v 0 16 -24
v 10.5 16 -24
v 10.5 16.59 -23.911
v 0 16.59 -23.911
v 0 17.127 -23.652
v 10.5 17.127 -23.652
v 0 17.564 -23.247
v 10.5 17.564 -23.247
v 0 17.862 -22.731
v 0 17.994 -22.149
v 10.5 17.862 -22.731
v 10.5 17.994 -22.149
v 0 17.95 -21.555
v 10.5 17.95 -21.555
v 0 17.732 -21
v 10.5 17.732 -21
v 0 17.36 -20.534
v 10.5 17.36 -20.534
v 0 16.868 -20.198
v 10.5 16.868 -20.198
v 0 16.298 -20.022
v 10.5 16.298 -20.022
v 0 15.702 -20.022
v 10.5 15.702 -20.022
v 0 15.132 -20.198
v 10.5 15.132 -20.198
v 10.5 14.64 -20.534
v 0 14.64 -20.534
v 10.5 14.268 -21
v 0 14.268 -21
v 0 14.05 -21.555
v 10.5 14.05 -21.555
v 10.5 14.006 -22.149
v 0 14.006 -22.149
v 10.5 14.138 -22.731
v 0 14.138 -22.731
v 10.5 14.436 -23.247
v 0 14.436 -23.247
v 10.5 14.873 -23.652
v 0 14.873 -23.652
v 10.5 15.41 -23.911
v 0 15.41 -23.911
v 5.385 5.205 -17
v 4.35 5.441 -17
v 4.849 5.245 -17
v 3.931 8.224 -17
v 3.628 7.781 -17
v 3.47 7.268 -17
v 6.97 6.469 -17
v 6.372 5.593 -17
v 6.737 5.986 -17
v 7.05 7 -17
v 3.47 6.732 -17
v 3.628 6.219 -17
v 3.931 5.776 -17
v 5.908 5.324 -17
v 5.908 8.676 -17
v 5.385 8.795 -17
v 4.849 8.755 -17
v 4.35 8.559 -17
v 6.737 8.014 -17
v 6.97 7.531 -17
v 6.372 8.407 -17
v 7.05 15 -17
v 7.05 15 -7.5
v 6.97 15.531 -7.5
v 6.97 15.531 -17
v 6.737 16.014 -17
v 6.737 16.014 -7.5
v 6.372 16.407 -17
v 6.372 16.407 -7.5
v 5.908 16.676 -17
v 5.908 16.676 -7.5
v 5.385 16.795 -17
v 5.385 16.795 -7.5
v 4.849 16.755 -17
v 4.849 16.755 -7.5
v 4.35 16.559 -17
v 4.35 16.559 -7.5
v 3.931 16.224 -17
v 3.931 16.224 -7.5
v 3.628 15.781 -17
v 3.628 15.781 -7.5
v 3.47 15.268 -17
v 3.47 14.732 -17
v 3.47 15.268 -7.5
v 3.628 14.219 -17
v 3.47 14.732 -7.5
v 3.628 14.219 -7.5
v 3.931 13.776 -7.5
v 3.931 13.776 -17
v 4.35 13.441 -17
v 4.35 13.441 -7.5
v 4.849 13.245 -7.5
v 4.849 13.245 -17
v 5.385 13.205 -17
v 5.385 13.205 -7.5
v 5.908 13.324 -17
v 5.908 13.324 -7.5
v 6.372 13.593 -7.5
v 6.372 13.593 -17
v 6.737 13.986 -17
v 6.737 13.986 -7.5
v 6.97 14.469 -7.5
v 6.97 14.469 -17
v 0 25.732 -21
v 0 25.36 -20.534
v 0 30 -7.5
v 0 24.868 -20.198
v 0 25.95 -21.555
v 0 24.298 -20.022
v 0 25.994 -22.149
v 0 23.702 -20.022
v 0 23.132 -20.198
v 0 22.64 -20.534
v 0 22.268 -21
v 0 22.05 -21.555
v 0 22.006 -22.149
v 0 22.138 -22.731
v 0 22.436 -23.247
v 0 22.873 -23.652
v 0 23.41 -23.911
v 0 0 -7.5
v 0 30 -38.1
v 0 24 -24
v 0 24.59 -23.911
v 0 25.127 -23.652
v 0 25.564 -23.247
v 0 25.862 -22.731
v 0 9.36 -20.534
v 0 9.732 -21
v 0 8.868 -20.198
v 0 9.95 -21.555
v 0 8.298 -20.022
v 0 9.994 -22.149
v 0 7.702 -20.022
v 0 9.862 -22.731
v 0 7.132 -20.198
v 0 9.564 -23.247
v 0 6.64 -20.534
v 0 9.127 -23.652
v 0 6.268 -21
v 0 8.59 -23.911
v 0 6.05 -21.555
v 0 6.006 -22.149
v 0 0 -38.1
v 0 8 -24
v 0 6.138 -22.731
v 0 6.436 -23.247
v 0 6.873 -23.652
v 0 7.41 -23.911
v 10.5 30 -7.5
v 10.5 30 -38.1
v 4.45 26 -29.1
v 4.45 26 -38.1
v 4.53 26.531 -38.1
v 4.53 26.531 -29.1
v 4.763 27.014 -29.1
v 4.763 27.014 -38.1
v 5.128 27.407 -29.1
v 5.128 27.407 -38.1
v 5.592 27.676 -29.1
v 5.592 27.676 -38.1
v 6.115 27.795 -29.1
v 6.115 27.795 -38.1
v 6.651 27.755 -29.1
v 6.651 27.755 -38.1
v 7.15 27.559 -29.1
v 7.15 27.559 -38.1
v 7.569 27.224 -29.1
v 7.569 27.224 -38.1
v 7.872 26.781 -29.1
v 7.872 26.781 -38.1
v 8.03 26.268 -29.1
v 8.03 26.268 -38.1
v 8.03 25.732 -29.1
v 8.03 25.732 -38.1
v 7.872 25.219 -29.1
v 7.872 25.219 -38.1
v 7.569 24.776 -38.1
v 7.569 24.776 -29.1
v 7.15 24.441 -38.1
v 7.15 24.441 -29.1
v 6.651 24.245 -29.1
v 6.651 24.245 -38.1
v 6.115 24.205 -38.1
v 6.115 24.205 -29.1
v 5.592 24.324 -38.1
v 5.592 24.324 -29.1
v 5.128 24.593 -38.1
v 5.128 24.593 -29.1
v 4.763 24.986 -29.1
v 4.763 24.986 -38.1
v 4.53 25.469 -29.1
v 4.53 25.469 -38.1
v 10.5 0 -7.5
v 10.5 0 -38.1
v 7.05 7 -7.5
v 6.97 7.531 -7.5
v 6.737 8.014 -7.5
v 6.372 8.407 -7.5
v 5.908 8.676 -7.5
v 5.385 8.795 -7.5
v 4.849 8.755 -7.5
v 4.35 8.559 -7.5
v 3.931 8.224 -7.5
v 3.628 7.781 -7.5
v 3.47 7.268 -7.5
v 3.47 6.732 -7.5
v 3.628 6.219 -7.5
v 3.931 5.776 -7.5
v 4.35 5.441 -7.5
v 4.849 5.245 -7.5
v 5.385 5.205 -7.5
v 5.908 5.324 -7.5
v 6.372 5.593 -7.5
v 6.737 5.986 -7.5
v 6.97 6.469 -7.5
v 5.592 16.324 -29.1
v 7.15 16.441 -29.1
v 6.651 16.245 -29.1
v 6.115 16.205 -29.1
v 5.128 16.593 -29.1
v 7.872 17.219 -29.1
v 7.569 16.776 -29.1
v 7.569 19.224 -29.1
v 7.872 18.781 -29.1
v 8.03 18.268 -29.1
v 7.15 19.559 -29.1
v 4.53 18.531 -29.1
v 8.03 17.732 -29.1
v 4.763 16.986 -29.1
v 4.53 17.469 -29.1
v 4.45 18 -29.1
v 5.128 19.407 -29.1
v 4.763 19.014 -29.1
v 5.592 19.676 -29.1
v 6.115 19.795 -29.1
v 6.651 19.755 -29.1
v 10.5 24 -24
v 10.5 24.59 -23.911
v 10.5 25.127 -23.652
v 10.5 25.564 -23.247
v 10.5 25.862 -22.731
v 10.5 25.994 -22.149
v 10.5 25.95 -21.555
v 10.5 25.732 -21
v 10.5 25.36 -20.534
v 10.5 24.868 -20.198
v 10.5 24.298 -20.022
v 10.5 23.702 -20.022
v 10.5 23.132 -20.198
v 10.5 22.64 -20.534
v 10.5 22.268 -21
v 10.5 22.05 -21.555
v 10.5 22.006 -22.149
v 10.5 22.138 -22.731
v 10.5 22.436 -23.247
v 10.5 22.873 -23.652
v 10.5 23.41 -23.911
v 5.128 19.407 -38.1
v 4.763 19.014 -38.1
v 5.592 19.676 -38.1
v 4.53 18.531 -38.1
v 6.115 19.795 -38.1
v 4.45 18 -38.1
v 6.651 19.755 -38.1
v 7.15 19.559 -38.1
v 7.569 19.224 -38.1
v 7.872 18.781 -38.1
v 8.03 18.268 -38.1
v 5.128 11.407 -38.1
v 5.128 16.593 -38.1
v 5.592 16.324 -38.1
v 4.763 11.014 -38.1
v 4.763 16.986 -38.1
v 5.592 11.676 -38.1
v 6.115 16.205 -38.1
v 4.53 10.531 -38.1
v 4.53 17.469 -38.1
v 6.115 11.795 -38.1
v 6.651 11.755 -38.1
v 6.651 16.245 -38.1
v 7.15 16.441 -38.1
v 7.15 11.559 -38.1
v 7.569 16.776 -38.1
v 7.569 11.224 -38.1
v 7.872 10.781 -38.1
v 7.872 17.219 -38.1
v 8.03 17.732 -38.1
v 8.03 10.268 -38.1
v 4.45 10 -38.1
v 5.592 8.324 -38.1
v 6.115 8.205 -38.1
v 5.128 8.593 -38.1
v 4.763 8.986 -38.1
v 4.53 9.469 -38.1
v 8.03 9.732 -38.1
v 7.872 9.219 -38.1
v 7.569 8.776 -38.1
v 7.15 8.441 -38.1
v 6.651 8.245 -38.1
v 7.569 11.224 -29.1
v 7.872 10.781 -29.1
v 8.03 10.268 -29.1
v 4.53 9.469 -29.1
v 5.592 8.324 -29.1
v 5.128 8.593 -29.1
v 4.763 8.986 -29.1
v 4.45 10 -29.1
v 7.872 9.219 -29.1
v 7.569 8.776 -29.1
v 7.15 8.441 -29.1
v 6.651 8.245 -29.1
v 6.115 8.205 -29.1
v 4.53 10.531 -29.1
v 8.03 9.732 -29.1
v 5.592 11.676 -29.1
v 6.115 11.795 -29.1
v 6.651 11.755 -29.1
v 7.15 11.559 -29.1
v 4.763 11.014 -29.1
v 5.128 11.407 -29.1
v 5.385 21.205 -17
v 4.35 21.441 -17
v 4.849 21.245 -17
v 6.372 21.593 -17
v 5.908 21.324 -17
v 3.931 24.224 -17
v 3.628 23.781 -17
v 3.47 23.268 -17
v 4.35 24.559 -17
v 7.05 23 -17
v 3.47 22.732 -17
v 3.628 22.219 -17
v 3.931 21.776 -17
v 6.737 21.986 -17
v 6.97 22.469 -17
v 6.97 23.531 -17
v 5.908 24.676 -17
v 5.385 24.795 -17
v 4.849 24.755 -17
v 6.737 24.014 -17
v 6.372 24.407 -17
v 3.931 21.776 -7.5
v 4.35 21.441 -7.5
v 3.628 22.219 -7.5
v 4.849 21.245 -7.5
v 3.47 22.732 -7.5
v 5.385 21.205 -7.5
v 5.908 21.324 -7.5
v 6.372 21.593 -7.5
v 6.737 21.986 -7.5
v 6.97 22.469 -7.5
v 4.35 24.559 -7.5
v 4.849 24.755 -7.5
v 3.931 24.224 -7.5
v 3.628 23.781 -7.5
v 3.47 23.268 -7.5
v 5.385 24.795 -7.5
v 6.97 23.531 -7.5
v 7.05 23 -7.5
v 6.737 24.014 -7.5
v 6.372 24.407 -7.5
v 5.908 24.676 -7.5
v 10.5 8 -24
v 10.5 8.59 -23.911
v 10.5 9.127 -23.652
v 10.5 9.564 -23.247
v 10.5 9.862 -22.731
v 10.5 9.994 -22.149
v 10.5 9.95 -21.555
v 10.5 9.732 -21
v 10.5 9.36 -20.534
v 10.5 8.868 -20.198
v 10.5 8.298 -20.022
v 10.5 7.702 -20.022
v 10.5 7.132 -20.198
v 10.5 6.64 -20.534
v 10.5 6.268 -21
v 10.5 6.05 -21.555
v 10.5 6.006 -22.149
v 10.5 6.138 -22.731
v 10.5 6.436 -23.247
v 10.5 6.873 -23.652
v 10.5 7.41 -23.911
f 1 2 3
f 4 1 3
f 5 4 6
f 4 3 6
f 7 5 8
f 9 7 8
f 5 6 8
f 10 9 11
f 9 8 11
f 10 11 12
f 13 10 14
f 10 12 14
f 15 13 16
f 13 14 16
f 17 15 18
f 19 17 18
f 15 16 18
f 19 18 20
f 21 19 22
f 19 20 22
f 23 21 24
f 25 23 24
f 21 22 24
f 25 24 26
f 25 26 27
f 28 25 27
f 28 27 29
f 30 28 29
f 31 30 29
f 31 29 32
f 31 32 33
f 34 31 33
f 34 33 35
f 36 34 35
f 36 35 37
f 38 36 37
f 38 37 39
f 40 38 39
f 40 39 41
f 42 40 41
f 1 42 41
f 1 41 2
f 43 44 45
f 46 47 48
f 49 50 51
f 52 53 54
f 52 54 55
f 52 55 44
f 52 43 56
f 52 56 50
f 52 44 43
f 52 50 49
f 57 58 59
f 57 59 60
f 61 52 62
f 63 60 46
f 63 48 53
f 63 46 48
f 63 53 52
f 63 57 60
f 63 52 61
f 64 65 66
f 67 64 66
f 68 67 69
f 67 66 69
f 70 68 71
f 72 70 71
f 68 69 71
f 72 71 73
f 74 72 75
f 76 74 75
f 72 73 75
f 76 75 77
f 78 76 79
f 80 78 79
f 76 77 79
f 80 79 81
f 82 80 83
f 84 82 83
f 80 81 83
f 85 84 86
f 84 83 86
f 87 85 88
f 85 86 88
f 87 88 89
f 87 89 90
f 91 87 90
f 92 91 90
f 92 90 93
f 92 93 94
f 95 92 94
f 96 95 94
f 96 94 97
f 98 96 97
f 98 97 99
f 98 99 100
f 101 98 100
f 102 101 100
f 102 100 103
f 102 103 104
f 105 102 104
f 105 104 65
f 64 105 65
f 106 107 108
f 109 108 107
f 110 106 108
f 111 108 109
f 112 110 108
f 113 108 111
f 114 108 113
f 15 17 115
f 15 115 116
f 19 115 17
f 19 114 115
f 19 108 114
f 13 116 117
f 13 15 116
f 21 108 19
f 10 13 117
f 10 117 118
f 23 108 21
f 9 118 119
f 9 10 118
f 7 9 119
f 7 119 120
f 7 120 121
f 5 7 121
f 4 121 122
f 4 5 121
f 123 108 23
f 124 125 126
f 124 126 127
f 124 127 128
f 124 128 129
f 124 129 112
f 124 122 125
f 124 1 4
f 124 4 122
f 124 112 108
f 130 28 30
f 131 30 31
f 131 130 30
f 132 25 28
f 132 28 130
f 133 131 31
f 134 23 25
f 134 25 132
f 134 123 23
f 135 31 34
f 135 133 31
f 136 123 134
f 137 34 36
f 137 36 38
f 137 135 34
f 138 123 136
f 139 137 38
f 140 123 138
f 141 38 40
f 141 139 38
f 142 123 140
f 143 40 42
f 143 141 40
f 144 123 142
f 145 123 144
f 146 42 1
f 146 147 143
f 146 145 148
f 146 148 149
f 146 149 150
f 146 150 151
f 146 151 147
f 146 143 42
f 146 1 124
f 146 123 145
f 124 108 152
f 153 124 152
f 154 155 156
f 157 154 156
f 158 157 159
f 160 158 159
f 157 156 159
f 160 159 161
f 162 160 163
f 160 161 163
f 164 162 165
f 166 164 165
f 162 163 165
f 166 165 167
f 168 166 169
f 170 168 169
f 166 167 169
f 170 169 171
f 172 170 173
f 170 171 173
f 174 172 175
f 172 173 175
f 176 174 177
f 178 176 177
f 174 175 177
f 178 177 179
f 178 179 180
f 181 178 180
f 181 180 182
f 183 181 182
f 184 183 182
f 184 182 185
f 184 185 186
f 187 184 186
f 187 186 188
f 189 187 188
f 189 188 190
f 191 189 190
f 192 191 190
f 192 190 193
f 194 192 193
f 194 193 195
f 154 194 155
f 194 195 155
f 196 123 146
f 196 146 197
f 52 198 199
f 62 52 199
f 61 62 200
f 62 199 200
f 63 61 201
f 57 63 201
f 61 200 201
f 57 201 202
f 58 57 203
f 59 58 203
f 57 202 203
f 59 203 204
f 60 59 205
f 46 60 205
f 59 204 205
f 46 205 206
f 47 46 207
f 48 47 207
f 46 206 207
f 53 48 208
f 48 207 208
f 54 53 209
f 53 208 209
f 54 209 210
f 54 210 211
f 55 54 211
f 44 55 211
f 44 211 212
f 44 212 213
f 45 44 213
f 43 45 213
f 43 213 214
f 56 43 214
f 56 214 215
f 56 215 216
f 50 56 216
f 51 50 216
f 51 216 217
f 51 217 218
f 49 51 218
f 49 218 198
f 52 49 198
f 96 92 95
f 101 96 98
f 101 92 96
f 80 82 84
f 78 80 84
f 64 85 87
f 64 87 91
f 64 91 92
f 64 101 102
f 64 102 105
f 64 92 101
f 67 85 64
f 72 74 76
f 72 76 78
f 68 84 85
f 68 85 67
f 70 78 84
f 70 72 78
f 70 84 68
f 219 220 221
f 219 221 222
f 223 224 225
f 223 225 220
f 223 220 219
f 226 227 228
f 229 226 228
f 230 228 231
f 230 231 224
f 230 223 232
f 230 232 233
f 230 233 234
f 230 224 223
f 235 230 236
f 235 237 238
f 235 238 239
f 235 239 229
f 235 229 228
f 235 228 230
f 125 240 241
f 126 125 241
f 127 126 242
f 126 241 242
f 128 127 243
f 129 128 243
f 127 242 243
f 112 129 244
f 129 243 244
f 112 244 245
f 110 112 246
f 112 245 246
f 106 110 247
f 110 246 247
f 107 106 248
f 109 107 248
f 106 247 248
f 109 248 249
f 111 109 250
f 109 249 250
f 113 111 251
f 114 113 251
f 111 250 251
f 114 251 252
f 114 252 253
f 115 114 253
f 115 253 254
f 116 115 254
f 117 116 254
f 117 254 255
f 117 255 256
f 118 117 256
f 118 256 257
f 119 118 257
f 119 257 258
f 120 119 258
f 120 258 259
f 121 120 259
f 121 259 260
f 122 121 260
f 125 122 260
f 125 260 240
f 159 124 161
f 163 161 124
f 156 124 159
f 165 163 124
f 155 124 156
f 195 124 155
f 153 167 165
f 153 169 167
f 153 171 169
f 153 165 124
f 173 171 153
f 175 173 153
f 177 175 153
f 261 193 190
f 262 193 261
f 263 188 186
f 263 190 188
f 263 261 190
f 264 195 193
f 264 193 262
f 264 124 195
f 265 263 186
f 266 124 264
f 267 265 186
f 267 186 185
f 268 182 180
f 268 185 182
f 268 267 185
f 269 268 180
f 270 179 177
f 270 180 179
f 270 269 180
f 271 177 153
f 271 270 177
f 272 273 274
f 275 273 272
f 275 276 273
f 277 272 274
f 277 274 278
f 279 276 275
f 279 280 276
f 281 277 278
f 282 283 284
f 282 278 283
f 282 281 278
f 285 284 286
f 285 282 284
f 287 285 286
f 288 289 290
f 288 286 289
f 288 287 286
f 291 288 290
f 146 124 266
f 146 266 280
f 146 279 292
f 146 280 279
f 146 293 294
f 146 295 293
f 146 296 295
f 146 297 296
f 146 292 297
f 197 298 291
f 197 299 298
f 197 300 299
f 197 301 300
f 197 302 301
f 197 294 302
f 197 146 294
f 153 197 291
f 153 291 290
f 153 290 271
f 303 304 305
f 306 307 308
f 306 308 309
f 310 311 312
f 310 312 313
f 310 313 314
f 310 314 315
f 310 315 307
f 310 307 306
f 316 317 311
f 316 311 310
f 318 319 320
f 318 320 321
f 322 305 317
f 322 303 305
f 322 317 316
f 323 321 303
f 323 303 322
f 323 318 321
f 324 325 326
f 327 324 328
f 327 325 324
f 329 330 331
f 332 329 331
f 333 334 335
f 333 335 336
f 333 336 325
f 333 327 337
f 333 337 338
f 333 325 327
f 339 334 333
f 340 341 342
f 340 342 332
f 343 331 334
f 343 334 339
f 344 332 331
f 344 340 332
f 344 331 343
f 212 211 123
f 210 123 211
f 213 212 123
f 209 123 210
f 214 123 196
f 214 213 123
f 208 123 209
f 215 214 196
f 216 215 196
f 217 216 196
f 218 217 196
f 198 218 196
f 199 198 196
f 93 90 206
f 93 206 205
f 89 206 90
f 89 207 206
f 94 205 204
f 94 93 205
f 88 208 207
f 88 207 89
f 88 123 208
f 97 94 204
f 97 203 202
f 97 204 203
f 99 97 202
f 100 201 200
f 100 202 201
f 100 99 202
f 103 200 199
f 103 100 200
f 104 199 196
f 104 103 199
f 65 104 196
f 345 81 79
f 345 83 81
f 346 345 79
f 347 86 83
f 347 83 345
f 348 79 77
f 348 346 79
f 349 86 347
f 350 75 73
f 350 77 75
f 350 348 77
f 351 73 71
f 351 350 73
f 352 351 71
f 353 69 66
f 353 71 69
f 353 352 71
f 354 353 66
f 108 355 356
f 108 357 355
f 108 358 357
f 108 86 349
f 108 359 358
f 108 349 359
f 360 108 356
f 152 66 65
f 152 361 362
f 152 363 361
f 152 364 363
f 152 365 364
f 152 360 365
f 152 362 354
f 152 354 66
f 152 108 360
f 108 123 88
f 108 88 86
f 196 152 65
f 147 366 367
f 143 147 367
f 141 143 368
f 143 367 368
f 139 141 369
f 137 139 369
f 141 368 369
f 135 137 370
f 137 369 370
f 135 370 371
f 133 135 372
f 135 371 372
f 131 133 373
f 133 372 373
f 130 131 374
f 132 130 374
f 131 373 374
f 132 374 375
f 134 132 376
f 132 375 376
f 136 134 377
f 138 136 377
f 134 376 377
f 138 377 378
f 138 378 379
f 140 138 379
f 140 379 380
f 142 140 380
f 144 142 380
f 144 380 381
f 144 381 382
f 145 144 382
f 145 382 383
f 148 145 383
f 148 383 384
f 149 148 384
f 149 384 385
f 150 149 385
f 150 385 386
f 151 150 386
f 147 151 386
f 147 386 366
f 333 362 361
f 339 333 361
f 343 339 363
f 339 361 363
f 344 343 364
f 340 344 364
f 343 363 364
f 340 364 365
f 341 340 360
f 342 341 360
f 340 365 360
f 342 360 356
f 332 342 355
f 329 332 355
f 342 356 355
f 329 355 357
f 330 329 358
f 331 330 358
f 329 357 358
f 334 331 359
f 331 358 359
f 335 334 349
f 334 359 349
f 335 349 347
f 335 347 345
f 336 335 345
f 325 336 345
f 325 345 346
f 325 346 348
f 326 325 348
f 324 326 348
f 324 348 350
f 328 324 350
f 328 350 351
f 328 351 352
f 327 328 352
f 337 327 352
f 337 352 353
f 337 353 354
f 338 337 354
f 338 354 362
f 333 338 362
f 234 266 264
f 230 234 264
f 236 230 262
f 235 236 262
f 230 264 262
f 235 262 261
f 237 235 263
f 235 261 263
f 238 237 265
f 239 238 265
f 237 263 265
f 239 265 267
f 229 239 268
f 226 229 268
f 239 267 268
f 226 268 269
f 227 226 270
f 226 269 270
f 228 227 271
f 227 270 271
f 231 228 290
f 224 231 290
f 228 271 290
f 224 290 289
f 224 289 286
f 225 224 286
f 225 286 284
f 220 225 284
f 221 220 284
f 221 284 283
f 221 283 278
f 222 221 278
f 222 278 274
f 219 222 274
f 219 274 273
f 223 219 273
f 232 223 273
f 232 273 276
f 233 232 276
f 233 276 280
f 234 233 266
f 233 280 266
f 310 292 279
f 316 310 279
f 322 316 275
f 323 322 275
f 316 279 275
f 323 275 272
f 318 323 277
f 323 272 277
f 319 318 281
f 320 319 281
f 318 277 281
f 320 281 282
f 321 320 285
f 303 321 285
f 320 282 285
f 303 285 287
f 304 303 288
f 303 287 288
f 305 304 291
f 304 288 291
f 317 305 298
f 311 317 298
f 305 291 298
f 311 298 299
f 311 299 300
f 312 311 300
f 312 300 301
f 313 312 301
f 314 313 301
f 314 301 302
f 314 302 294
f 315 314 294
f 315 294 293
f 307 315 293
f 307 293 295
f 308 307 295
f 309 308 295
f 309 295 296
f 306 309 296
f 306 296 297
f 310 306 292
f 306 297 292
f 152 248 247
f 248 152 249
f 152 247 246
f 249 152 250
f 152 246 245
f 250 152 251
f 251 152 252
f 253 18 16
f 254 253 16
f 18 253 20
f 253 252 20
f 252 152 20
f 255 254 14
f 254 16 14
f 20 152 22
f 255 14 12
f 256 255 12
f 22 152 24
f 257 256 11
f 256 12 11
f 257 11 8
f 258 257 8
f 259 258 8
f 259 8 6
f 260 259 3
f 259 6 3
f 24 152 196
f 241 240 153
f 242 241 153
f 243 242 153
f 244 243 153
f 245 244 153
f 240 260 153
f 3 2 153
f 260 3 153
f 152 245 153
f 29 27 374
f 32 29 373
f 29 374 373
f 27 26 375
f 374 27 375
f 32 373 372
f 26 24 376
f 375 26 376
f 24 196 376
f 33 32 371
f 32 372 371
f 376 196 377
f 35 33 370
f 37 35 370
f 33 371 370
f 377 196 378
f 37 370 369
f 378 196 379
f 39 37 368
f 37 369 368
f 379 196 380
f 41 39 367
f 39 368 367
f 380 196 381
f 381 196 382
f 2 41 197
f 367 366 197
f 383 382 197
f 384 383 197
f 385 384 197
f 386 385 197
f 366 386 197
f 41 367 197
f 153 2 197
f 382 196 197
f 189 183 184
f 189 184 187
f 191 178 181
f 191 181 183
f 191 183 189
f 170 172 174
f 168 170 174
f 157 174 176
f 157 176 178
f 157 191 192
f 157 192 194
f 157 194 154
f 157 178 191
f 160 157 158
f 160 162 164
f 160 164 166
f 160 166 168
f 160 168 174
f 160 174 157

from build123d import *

# Parameters (mm, degrees)
SKETCH_1_W          = 10.5
SKETCH_1_H          = 38.1
EXTRUDE_1_DEPTH     = 30
SKETCH_2_R          = 2
CUT_EXTRUDE_1_DEPTH = 11
SKETCH_3_R          = 1.8
CUT_EXTRUDE_2_DEPTH = 17
SKETCH_4_R          = 1.8
CUT_EXTRUDE_3_DEPTH = 9
SKETCH_5_W          = 10.5
SKETCH_5_H          = 7.5
CUT_EXTRUDE_4_DEPTH = 30


with BuildPart() as part:
    # 草圖1 → 填料-伸長1 (new body)
    with BuildSketch(Plane(origin=(0, 0, 0), x_dir=(1, 0, 0), z_dir=(0, 1, 0))):
        with Locations((5.25, 19.05)):
            Rectangle(SKETCH_1_W, SKETCH_1_H)
    extrude(amount=EXTRUDE_1_DEPTH)

    # 草圖2 → 除料-伸長1 (cut)
    with BuildSketch(Plane(origin=(10.5, 0, 0), x_dir=(0, 0, -1), z_dir=(1, 0, 0))):
        with Locations((22, 24)):
            Circle(SKETCH_2_R)
        with Locations((22, 16)):
            Circle(SKETCH_2_R)
        with Locations((22, 8)):
            Circle(SKETCH_2_R)
    extrude(amount=-CUT_EXTRUDE_1_DEPTH, mode=Mode.SUBTRACT)

    # 草圖3 → 除料-伸長2 (cut)
    with BuildSketch(Plane.XY):
        with Locations((5.25, 23)):
            Circle(SKETCH_3_R)
        with Locations((5.25, 15)):
            Circle(SKETCH_3_R)
        with Locations((5.25, 7)):
            Circle(SKETCH_3_R)
    extrude(amount=-CUT_EXTRUDE_2_DEPTH, mode=Mode.SUBTRACT)

    # 草圖4 → 除料-伸長3 (cut)
    with BuildSketch(Plane(origin=(0, 0, -38.1), x_dir=(-1, 0, 0), z_dir=(0, 0, -1))):
        with Locations((-6.25, 26)):
            Circle(SKETCH_4_R)
        with Locations((-6.25, 18)):
            Circle(SKETCH_4_R)
        with Locations((-6.25, 10)):
            Circle(SKETCH_4_R)
    extrude(amount=-CUT_EXTRUDE_3_DEPTH, mode=Mode.SUBTRACT)

    # 草圖5 → 除料-伸長4 (cut)
    with BuildSketch(Plane(origin=(0, 30, 0), x_dir=(1, 0, 0), z_dir=(0, 1, 0))):
        with Locations((5.25, 3.75)):
            Rectangle(SKETCH_5_W, SKETCH_5_H)
    extrude(amount=-CUT_EXTRUDE_4_DEPTH, mode=Mode.SUBTRACT)


solid = part.part
